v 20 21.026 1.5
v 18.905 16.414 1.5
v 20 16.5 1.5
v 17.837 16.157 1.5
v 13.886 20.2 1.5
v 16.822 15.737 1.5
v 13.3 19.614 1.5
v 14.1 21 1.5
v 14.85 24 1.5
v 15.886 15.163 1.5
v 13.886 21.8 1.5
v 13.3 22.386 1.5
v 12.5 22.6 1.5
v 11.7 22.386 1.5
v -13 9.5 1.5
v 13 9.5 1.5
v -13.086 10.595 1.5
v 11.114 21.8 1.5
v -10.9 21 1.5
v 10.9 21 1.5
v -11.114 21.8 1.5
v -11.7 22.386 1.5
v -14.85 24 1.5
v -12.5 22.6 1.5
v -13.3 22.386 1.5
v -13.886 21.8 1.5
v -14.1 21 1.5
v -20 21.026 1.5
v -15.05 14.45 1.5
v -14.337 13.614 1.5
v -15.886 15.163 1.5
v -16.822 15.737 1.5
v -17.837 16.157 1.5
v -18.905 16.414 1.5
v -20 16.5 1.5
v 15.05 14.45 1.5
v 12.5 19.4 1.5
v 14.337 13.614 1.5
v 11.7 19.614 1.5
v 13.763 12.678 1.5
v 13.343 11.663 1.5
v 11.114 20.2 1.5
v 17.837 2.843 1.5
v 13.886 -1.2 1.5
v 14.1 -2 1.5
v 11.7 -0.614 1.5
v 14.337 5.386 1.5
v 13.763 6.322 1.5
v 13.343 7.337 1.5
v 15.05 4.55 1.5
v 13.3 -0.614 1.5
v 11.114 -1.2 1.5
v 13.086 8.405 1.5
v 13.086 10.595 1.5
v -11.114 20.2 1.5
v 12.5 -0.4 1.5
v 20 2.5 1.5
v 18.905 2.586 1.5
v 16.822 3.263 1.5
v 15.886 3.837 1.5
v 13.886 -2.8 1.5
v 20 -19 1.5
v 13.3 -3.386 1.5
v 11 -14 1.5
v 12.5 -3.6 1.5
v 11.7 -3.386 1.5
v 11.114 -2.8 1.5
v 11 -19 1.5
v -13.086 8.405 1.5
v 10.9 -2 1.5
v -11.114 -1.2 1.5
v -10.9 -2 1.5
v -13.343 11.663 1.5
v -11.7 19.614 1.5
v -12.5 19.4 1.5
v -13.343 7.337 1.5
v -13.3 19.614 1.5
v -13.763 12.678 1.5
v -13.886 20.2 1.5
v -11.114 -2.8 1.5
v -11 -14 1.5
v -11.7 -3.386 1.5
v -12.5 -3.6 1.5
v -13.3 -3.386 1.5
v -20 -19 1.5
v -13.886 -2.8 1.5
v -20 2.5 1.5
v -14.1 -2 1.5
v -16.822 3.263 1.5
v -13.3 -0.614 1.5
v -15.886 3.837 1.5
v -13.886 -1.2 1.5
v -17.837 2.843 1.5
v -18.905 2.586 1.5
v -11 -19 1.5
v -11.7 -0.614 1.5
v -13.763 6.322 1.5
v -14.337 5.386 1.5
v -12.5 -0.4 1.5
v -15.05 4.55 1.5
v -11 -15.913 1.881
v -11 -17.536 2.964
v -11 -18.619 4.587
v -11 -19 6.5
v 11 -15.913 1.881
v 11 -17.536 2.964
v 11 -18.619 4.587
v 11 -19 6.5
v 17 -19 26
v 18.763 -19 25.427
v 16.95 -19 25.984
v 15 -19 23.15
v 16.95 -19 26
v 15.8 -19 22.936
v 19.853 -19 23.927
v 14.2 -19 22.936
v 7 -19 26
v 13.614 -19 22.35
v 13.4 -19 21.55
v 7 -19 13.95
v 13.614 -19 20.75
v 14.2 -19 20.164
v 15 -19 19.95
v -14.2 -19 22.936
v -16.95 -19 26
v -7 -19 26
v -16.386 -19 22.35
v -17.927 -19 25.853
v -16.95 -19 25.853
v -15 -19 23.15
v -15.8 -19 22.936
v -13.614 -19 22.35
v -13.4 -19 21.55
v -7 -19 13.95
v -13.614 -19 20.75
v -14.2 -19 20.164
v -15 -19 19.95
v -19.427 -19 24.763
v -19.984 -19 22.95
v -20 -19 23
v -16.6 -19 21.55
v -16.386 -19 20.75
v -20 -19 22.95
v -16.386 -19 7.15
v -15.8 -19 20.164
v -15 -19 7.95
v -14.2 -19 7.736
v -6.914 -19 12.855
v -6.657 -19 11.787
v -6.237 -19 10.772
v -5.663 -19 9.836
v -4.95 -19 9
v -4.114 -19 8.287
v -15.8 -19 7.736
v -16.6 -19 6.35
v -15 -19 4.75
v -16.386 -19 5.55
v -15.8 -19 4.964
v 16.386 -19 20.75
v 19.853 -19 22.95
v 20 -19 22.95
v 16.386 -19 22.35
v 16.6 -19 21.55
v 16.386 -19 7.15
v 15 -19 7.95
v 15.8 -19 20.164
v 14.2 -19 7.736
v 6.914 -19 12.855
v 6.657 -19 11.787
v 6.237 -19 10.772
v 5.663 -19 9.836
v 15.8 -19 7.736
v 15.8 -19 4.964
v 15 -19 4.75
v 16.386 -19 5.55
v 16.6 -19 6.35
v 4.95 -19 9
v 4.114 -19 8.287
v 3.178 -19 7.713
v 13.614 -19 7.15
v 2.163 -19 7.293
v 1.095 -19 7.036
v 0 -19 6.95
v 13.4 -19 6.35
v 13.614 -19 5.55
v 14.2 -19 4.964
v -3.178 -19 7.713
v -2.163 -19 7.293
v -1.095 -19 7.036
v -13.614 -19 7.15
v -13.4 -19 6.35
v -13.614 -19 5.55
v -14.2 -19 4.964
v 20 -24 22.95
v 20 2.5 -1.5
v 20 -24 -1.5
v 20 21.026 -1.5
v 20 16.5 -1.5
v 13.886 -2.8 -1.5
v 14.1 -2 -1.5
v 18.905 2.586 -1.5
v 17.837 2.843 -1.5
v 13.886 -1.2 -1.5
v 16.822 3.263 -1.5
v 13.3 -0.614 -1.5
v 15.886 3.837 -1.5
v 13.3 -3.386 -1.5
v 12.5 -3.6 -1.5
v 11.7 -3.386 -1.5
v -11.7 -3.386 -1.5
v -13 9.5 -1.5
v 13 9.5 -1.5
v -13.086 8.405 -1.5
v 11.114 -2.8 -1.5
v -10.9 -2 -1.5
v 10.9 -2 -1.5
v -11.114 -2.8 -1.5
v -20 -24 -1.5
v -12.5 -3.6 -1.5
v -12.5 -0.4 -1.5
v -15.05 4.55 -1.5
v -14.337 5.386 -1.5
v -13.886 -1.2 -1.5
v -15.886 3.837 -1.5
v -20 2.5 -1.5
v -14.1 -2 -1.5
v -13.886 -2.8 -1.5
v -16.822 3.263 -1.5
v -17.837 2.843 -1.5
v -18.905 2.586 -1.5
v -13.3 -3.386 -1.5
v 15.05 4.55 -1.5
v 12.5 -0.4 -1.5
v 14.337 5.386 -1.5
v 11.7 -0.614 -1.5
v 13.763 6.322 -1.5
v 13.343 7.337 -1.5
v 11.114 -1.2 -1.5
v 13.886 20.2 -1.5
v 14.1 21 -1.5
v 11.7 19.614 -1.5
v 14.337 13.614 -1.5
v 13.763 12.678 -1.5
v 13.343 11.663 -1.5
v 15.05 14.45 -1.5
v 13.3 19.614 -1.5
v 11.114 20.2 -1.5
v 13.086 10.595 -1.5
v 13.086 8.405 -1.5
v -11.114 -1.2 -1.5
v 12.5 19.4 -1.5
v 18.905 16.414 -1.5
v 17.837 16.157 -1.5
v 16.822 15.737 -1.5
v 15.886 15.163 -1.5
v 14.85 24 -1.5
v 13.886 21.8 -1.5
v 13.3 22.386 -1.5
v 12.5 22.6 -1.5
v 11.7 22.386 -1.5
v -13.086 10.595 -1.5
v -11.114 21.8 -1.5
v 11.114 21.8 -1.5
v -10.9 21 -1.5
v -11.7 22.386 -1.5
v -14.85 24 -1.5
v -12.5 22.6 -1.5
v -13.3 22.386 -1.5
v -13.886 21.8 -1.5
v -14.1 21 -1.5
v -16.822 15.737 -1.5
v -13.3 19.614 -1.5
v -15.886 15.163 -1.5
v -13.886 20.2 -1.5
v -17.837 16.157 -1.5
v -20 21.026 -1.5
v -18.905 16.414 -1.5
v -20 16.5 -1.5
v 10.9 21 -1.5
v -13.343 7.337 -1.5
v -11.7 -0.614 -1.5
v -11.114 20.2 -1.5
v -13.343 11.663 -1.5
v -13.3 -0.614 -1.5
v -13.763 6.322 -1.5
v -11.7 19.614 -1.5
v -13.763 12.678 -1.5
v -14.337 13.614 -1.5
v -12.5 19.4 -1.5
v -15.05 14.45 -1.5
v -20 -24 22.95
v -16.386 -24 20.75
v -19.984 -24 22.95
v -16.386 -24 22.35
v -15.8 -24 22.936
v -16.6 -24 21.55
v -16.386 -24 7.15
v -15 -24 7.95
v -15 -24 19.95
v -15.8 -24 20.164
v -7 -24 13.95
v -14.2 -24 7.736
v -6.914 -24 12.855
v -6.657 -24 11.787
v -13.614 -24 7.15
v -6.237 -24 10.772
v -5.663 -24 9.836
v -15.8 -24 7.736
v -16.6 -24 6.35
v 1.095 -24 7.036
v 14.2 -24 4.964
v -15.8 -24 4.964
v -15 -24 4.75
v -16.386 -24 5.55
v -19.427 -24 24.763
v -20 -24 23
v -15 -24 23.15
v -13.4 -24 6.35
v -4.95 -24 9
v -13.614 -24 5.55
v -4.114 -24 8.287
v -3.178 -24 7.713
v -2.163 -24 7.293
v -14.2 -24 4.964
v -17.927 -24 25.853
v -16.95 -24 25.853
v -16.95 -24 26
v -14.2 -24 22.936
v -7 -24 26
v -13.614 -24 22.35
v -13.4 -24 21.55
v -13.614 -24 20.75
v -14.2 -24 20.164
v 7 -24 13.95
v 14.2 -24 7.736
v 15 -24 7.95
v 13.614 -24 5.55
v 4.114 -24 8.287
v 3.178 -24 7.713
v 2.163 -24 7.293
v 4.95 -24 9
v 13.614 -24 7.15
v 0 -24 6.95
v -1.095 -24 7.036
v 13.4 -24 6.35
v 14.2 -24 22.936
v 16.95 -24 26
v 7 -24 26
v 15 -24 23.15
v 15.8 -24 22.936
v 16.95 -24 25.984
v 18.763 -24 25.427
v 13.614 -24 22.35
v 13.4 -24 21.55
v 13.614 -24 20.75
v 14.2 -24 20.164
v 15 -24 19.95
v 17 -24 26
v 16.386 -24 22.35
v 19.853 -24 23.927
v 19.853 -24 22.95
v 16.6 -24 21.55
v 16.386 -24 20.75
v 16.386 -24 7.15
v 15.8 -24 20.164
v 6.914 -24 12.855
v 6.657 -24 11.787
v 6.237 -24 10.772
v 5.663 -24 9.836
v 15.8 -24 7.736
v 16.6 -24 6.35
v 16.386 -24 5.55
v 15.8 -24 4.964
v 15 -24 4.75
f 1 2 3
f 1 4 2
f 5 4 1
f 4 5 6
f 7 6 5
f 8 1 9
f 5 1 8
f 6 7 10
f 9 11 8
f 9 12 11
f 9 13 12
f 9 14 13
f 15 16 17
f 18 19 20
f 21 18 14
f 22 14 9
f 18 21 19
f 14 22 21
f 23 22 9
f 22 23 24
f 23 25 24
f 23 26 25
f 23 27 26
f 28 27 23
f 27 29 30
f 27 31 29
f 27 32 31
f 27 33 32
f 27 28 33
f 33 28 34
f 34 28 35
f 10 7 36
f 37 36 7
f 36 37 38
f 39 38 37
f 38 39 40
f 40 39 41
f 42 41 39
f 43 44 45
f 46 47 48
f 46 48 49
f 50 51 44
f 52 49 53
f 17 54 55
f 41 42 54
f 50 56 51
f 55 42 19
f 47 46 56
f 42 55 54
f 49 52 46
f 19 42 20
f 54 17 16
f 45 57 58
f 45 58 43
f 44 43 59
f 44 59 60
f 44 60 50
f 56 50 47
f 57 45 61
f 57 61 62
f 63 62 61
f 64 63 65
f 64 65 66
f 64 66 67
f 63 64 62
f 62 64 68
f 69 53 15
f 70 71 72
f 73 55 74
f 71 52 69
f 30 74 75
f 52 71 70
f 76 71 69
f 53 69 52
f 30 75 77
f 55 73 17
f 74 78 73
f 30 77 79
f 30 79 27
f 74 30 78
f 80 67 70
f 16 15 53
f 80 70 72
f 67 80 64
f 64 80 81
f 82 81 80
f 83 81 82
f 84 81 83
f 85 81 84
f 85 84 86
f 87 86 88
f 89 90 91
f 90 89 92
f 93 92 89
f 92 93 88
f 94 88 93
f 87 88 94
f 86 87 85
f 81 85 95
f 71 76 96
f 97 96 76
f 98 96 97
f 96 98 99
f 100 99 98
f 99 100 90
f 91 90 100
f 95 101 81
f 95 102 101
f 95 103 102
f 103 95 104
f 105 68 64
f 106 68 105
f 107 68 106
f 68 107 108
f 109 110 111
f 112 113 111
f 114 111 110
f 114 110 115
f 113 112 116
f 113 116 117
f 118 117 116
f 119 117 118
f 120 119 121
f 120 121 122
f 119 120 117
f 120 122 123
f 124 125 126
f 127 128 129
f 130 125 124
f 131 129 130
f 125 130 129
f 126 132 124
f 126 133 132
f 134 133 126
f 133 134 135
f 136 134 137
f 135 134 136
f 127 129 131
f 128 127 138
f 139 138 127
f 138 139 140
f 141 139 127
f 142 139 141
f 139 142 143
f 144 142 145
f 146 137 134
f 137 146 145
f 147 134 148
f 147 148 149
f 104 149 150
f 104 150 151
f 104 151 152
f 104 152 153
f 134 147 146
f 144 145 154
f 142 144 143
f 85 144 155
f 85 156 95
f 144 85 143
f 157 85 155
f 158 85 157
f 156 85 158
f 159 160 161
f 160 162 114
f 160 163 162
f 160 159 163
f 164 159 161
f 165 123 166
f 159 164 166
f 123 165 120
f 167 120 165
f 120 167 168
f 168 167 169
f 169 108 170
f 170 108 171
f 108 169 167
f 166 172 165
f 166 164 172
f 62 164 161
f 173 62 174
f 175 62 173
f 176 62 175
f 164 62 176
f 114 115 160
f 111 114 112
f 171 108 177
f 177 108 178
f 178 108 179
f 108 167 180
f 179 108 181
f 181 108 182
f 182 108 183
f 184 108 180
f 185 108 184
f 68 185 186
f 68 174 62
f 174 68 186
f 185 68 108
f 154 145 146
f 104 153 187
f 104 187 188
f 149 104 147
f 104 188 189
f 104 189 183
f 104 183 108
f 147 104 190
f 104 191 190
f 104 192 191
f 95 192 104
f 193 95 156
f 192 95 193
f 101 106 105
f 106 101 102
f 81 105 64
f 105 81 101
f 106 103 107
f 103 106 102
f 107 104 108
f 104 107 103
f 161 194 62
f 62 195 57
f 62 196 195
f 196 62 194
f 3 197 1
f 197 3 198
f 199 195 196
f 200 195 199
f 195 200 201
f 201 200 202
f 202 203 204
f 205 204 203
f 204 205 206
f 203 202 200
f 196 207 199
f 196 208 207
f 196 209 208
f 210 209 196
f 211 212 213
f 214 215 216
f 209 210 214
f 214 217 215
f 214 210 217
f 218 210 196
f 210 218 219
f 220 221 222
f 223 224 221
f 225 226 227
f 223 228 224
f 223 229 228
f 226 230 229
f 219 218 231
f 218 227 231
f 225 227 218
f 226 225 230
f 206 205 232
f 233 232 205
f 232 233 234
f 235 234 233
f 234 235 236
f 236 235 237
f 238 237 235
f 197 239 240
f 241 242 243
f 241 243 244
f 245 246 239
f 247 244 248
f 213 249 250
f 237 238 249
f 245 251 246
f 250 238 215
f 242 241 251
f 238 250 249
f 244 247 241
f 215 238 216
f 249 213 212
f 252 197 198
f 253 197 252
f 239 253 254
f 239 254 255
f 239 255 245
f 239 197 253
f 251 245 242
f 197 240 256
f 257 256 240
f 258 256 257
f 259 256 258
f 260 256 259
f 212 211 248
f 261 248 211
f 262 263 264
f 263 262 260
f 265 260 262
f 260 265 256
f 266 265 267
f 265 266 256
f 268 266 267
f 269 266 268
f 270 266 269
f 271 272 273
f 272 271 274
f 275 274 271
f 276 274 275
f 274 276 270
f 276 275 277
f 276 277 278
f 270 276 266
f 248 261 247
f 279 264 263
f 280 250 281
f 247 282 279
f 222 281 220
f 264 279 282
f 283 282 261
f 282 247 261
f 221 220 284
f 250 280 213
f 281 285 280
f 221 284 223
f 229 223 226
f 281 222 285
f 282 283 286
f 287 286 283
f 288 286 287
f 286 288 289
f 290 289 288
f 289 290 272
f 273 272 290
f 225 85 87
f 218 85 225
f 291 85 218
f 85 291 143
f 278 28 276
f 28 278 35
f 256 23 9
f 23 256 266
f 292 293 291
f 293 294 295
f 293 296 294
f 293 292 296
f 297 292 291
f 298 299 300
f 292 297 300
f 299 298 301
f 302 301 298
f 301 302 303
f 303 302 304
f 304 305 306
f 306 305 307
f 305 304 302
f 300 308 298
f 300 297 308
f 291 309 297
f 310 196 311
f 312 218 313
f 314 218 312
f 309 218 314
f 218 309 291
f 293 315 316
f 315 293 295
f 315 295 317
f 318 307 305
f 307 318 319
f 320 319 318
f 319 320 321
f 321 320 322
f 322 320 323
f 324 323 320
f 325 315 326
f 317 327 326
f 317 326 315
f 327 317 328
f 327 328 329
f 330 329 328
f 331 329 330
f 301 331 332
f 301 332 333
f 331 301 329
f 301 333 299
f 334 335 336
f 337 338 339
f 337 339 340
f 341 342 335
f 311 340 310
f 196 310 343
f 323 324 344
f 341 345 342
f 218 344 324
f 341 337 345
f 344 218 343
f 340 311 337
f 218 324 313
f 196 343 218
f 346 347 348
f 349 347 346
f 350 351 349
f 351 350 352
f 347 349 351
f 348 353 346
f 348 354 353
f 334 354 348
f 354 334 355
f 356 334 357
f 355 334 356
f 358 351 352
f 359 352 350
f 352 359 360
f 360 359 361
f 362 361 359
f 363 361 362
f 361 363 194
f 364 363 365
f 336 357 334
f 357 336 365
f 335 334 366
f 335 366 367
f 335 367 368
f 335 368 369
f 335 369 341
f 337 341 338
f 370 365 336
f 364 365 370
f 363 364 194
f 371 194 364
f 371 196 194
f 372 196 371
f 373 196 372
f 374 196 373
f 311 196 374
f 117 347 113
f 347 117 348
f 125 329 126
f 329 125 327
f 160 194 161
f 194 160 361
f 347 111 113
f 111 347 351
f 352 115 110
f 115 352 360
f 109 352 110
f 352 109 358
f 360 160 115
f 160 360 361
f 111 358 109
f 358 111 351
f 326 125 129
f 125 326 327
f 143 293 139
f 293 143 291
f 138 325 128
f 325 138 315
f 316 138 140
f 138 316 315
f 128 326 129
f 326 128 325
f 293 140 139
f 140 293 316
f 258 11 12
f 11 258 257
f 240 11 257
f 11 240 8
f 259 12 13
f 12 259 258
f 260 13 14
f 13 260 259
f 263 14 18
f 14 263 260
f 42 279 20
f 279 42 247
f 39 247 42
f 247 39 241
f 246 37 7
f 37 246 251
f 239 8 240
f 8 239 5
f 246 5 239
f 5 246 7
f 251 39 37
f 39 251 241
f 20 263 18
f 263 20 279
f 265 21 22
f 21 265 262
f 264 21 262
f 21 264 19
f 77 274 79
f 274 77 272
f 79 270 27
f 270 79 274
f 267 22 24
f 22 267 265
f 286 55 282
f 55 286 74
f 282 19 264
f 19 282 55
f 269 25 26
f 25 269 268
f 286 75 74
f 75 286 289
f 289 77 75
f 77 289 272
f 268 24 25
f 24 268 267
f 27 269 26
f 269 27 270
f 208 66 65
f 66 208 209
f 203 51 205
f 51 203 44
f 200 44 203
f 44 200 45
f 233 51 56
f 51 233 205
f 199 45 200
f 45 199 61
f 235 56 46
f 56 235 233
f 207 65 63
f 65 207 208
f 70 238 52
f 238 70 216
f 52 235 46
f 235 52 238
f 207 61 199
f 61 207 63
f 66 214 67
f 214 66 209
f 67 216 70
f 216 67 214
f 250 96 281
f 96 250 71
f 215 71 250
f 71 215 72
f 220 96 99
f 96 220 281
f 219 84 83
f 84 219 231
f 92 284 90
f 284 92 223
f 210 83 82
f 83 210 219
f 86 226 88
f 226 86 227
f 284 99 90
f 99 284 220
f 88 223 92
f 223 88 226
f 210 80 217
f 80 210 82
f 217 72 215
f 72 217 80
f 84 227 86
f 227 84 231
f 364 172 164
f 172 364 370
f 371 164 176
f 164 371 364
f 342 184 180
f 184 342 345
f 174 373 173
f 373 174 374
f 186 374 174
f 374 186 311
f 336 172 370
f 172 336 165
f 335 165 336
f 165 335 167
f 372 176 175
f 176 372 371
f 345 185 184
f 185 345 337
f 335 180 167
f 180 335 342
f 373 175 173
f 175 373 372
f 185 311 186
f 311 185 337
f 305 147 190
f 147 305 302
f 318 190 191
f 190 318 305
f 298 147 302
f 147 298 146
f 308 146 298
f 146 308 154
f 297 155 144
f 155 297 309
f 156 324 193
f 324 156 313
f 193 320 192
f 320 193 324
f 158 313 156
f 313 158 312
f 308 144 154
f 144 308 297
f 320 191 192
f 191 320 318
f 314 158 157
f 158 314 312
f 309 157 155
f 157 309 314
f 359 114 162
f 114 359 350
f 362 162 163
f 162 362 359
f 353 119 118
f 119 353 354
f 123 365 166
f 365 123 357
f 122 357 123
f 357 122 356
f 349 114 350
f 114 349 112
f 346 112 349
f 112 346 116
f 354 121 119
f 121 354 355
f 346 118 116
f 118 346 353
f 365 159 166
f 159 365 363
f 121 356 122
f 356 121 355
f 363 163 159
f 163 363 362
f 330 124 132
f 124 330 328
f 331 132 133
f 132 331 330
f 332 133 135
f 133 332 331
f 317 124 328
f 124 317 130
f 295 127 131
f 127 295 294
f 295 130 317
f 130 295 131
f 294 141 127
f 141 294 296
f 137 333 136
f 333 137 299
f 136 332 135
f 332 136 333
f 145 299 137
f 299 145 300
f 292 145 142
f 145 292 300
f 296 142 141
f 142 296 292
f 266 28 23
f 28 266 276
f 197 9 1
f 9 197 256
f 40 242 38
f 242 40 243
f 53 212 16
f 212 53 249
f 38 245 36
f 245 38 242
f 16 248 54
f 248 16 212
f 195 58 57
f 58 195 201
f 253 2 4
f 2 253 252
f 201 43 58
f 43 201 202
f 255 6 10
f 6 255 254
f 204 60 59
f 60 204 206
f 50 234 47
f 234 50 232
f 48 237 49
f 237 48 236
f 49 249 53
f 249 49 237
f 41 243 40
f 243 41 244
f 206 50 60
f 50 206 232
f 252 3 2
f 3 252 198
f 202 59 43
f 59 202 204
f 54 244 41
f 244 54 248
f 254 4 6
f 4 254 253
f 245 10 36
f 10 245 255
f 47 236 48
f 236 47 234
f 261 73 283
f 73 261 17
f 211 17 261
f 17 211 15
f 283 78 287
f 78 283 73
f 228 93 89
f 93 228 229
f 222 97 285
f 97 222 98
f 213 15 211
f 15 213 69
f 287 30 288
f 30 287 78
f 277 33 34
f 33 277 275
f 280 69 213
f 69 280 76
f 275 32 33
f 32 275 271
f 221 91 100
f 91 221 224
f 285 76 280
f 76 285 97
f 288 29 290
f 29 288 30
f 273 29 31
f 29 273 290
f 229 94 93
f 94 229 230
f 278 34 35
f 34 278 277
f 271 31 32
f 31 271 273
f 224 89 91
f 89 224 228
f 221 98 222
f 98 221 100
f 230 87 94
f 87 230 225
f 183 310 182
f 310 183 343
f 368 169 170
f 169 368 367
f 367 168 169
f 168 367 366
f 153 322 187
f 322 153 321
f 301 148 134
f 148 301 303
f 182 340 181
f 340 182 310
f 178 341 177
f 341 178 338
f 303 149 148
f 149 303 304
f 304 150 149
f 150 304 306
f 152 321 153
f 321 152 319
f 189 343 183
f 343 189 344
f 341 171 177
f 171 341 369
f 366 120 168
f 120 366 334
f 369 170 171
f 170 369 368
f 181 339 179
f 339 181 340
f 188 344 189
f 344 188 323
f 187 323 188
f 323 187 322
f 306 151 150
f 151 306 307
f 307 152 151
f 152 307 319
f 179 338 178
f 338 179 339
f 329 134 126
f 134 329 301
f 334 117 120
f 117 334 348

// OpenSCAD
//j-head infos : 
//total length = 64.7;
//collar inner dia= 12.15
//outer_dia=16;
//isolator_height=49.85
//top_to_collar=4.65;
//collar height=4.6
//collar_bottom_to_coolers=10;
//cooler_height=2.25

//last cooler to bottom=15.75;

hot_end_upper_dia=16;
hot_end_inner_dia=12;
hot_end_groove_length = 4.6;
hot_end_upper_length=4.85;

hot_end_lower_dia =34.5;
hot_end_lower_taper_lng = 10;
hot_end_lower_taper_str_lng=5;

hot_end_holder_length=20;
hot_end_holder_height=4.6;

hot_end_main_block_length=35;

groove_bottom_to_coolers=10;
cooler_height=2.25;
cooler_count=5;
cooler_border=0.95;

bowden_holder_dist=32;
bowden_holder_bolt_dia=4;
bowden_holder_lng= 12;
bowden_tube_dia=5;

bowden_nut_height=3.9;
bowden_nut_dia=9;

block_width=40;
block_length=48;
fan_bolt_dia=4;
fan_bolt_dist=32.2;


bolt_dia = 3.2;
nut_dia=6.4;
nut_height=2.0;

platform_holes_x_dist = 12.5;//21
platform_holes_y_dist = 21;//28;//2 ->-26
platform_holes_y_dist2 = -2;//28;//2 ->-26

belt_pos = -15;
belt_holder_width=24.5;
belt_holder_height=5;

belt_width =6;
belt_thickness=1.95;
belt_dist =10.95;//7
belt_clamp_holes_spacing=30;
belt_clamp_holes_extra=3;
belt_clamp_holes_dist=belt_width+bolt_dia+belt_clamp_holes_extra*2;
echo("belt_clamp_holes_dist", belt_clamp_holes_dist);


hot_end_holder_hole_length =12;
hot_end_holder_hole_width =4;

fan_duct_id=25;
fan_duct_od=40;

fan_duct_slit =5;
slit_center = (fan_duct_od -fan_duct_id)/2 + fan_duct_id;
slit_od = slit_center+ fan_duct_slit/2;
slit_id= slit_center- fan_duct_slit/2;

duct_bolt_dist = 33;
duct_bolt_dia=3.1;
duct_bolt_hole_length=15;
duct_nut_height=2.0;
duct_nut_dia=6.4;
duct_nut_dist =10;

//%rotate([0,0,270]) import_stl("tripple_bearing_platform_back.stl");
//%translate([0,-4.8,15]) import_stl("/home/ckaos/GraphX/data/reprappro-Huxley/Print-Huxley/Individual-STLs/nozzle-mounting.stl");

belt_clamper();
//translate([0,0,22.5])hot_end_holder();
//translate([0,-block_length/2-5,32.5]) rotate([90,0,0]) duct();




module hot_end_holder(thickness=11, air_duct=false)
{
	lat_hole_b_lng = hot_end_holder_hole_length-hot_end_holder_hole_width;

	hot_end_lower_offset = hot_end_groove_length + hot_end_upper_length;
	hot_end_lower_length = block_length-bowden_holder_lng - hot_end_upper_length - hot_end_groove_length;
	hot_end_top = bowden_holder_lng;
	
	bowden_nut_offset =  bowden_holder_lng-bowden_nut_height;

	coolers_smooth=100;
	coolers_top = hot_end_top -hot_end_upper_length-hot_end_groove_length- groove_bottom_to_coolers-cooler_height/2;

	duct_air_conduit_lng= block_length - hot_end_top -hot_end_upper_length- hot_end_groove_length-groove_bottom_to_coolers;
	duct_bolts_pos = -block_length/2 +duct_bolt_hole_length/2;
	duct_nut_pos = -block_length/2 +duct_nut_dist;
	difference()
	{

		cube([block_width,block_length,thickness], center=true);

		//bowden tube hole
		translate([0,block_length/2+0.01,thickness/2]) rotate([90,0,0]) cylinder(h=bowden_holder_lng+0.1, r=bowden_tube_dia/2,$fn=12);
		//bowden tube nut hole
		translate([0,block_length/2-bowden_nut_offset,thickness/2]) rotate([90,0,0]) cylinder(h=bowden_nut_height+0.1, r=bowden_nut_dia/2,$fn=6);


		//hot_end hole
		//top
		translate([0,block_length/2-bowden_holder_lng,thickness/2]) rotate([90,0,0]) cylinder(h=hot_end_upper_length+0.01, r=hot_end_upper_dia/2,$fn=24);
		//groove
		translate([0,block_length/2-hot_end_top-hot_end_upper_length,thickness/2]) rotate([90,0,0]) cylinder(h=hot_end_groove_length+0.01, r=hot_end_inner_dia/2,$fn=24);
		//lower
		translate([0,block_length/2-bowden_holder_lng-hot_end_lower_offset,thickness/2]) rotate([90,0,0]) cylinder(h=hot_end_lower_length+0.01, r=hot_end_upper_dia/2, $fn=24);

		//hot end hole lower taper
		//translate([0,-block_length/2+hot_end_lower_taper_lng,thickness/2]) rotate([90,0,0]) cylinder(h=hot_end_lower_taper_lng+0.1, r1=hot_end_upper_dia/2, r2=fan_duct_id/2, $fn=24);
		//hot end hole lower taper2
		//translate([0,-block_length/2+hot_end_lower_taper_str_lng,thickness/2]) rotate([90,0,0]) cylinder(h=hot_end_lower_taper_str_lng+0.1, r=hot_end_lower_dia/2, $fn=24);

	

		//fan duct join holes
		if (air_duct)
		{
			translate([0,-block_length/2+duct_air_conduit_lng/2,thickness/2])
			rotate([90,0,0])
			difference()
			{
				difference()
				{
					cylinder(h=duct_air_conduit_lng+0.1, r=slit_od/2,$fn=24, center=true);
					cylinder(h=duct_air_conduit_lng+0.01, r=slit_id/2,$fn=24, center=true);
				}
				cube([5,block_length,thickness+0.1], center=true);	
				translate([10,0,0]) cube([1,block_length,thickness+0.1], center=true);
				translate([-10,0,0]) cube([1,block_length,thickness+0.1], center=true);
			}
			//cooling coils
		}

		translate([0,coolers_top-(cooler_border+cooler_height),thickness/2]) rotate([90,0,0]) 
		cooling_coil(hot_end_upper_dia/2+1.5, 2, coolers_smooth);

		translate([0,coolers_top-(cooler_border+cooler_height)-4,thickness/2]) rotate([90,0,0]) 
		 cylinder(h=8, r=hot_end_upper_dia/2+2.5, center=true,$fn=coolers_smooth);

		translate([0,coolers_top-(cooler_border+cooler_height)-8,thickness/2]) rotate([90,0,0]) 
		cooling_coil(hot_end_upper_dia/2+1.5, 2, coolers_smooth);

		//render()
		//{
		difference()
		{
			//translate([0,coolers_top-(cooler_border+cooler_height),thickness/2]) rotate([90,0,0]) 
			//cooling_coil(hot_end_upper_dia/2, 2, coolers_smooth);

			//translate([0,coolers_top-(cooler_border+cooler_height)+10,thickness/2]) rotate([90,0,0]) 
			//cooling_coil(hot_end_upper_dia/2, 2, coolers_smooth);

	
		/*for (i = [0:cooler_count-1])
		{
			
			translate([0,coolers_top-i*(cooler_border+cooler_height),thickness/2]) rotate([90,0,0]) 
			cooling_coil(hot_end_upper_dia/2+5, cooler_height, coolers_smooth);
		
		}*/
			//cube([5,block_length,thickness+0.1], center=true);		
			//translate([10,0,0]) cube([1,block_length,thickness+0.1], center=true);
		}
//}



		//lateral holes
		translate([14,10,0])
		{
		cube([hot_end_holder_hole_width,lat_hole_b_lng,thickness+0.1], center=true);
		translate([0,lat_hole_b_lng/2,0]) cylinder(h=thickness+0.1, r=hot_end_holder_hole_width/2, center=true,$fn=12);
		translate([0,-lat_hole_b_lng/2,0]) cylinder(h=thickness+0.1, r=hot_end_holder_hole_width/2, center=true,$fn=12);
		}

		translate([-14,10,0])
		{
		cube([hot_end_holder_hole_width,lat_hole_b_lng,thickness+0.1], center=true);
		translate([0,lat_hole_b_lng/2,0]) cylinder(h=thickness+0.1, r=hot_end_holder_hole_width/2, center=true,$fn=12);
		translate([0,-lat_hole_b_lng/2,0]) cylinder(h=thickness+0.1, r=hot_end_holder_hole_width/2, center=true,$fn=12);
		}


		//bolt holes
		translate([platform_holes_x_dist,platform_holes_y_dist,0])  cylinder(h=40, r=bolt_dia/2, center=true,$fn=12);
		translate([-platform_holes_x_dist,platform_holes_y_dist,0])  cylinder(h=40, r=bolt_dia/2, center=true,$fn=12);

		translate([platform_holes_x_dist,platform_holes_y_dist2,0])  cylinder(h=40, r=bolt_dia/2, center=true,$fn=12);
		translate([-platform_holes_x_dist,platform_holes_y_dist2,0])  cylinder(h=40, r=bolt_dia/2, center=true,$fn=12);

		//corner cuts
		 translate([-block_width/2,block_length/2+2.8,0])   rotate([0,0,30]) cube([10,10,thickness+0.1], center=true);
		 translate([block_width/2,block_length/2+2.8,0])   rotate([0,0,-30]) cube([10,10,thickness+0.1], center=true);

		
		//fan duct mount holes
		/*translate([duct_bolt_dist/2,duct_bolts_pos,-duct_bolt_dist/2+thickness/2]) rotate([90,0,0]) cylinder(h=duct_bolt_hole_length+0.01, r=duct_bolt_dia/2, center=true,$fn=12);

		translate([-duct_bolt_dist/2,duct_bolts_pos,-duct_bolt_dist/2+thickness/2]) rotate([90,0,0]) cylinder(h=duct_bolt_hole_length+0.01, r=duct_bolt_dia/2, center=true,$fn=12);
	
		
		translate([duct_bolt_dist/2,duct_nut_pos,-duct_bolt_dist/2+thickness/2])  cube([duct_nut_dia,duct_nut_height,10], center=true);
		translate([-duct_bolt_dist/2,duct_nut_pos,-duct_bolt_dist/2+thickness/2])  cube([duct_nut_dia,duct_nut_height,10], center=true);*/
		
	}
		//fan
		//%  translate([0,-4.2,thickness*2-5])   rotate([0,0,0])  fan();
}


module hot_end_holder_top(thickness=10)
{
	lat_hole_b_lng = hot_end_holder_hole_length-hot_end_holder_hole_width;

	hot_end_lower_offset = hot_end_notch_height + hot_end_upper_length;
	hot_end_lower_length = block_length-bowden_holder_lng - hot_end_upper_length - hot_end_notch_height;
	
	bowden_nut_offset =  bowden_holder_lng-bowden_nut_height;

	difference()
	{

		cube([block_width,block_length,thickness], center=true);

		//hot_end hole
		translate([0,block_length/2-bowden_holder_lng,thickness/2]) rotate([90,0,0]) cylinder(h=hot_end_upper_length, r=hot_end_upper_dia/2,$fn=24);

		translate([0,block_length/2-bowden_holder_lng,thickness/2]) rotate([90,0,0]) cylinder(h=block_length-bowden_holder_lng+0.1, r=hot_end_inner_dia/2,$fn=24);
		
		translate([0,block_length/2-bowden_holder_lng-hot_end_lower_offset,thickness/2]) rotate([90,0,0]) cylinder(h=hot_end_lower_length+0.1, r=hot_end_upper_dia/2,$fn=24);
		
		//bowden tube hole
		translate([0,block_length/2+0.01,thickness/2]) rotate([90,0,0]) cylinder(h=bowden_holder_lng+0.1, r=bowden_tube_dia/2,$fn=12);
		//bowden tube nut hole
		translate([0,block_length/2-bowden_nut_offset,thickness/2]) rotate([90,0,0]) cylinder(h=bowden_nut_height+0.1, r=bowden_nut_dia/2,$fn=6);

		
		//lateral holes
		translate([14,10,0])
		{
		cube([hot_end_holder_hole_width,lat_hole_b_lng,11], center=true);
		translate([0,lat_hole_b_lng/2,0]) cylinder(h=11, r=hot_end_holder_hole_width/2, center=true,$fn=12);
		translate([0,-lat_hole_b_lng/2,0]) cylinder(h=11, r=hot_end_holder_hole_width/2, center=true,$fn=12);
		}

		translate([-14,10,0])
		{
		cube([hot_end_holder_hole_width,lat_hole_b_lng,11], center=true);
		translate([0,lat_hole_b_lng/2,0]) cylinder(h=11, r=hot_end_holder_hole_width/2, center=true,$fn=12);
		translate([0,-lat_hole_b_lng/2,0]) cylinder(h=11, r=hot_end_holder_hole_width/2, center=true,$fn=12);
		}

		//bolt holes
		translate([platform_holes_x_dist,platform_holes_y_dist,0])  cylinder(h=40, r=bolt_dia/2, center=true,$fn=12);
		translate([-platform_holes_x_dist,platform_holes_y_dist,0])  cylinder(h=40, r=bolt_dia/2, center=true,$fn=12);

		translate([platform_holes_x_dist,platform_holes_y_dist2,0])  cylinder(h=40, r=bolt_dia/2, center=true,$fn=12);
		translate([-platform_holes_x_dist,platform_holes_y_dist2,0])  cylinder(h=40, r=bolt_dia/2, center=true,$fn=12);
	}
}

module cooling_coil(radius=10, circle_dia=1, smoothness=50)
{
	rotate_extrude(convexity =10, $fn=smoothness)
	translate([radius,0,0])
	circle(r=circle_dia/2 , $fn=smoothness);

	cylinder(h=circle_dia, r=radius, center=true,$fn=32);
}

module fan(thickness=10.3)
{
	difference()
	{
		cube([40,40,thickness], center=true);
		cylinder(h=thickness+0.1, r=38.4/2, center=true,$fn=32);
	}
}

module duct(duct_id=25, duct_od=40, slit=6, thickness=10)
{
	slit_center = (duct_od -duct_id)/2 + duct_id;
	slit_od = slit_center+ slit/2;
	slit_id= slit_center- slit/2;
	difference()
	{
		union()
		{	
			cube([block_width,block_width,thickness], center=true);
			cylinder(h=thickness, r=duct_od/2,$fn=24, center=true);
		}
	 	cylinder(h=thickness+0.01, r=duct_id/2,$fn=24, center=true);
		

		difference()
		{
			cylinder(h=thickness+1, r=slit_od/2,$fn=24, center=true);
			cylinder(h=thickness+1.01, r=slit_id/2,$fn=24, center=true);
		}

		//bolt holes
		rotate([0,0,90]) translate([duct_bolt_dist/2,duct_bolt_dist/2,0])  cylinder(h=15, r=duct_bolt_dia/2, center=true,$fn=12);
		rotate([0,0,90]) translate([duct_bolt_dist/2,-duct_bolt_dist/2,0])  cylinder(h=15, r=duct_bolt_dia/2, center=true,$fn=12);

		rotate([0,0,90]) translate([-duct_bolt_dist/2,duct_bolt_dist/2,0])  cylinder(h=15, r=duct_bolt_dia/2, center=true,$fn=12);
		rotate([0,0,90]) translate([-duct_bolt_dist/2,-duct_bolt_dist/2,0])  cylinder(h=15, r=duct_bolt_dia/2, center=true,$fn=12);

		
	}
	//radial holders
	difference()
	{
		union()
		{
			cube([block_width,2,10], center=true);
			rotate([0,0,90]) cube([block_width,2,10], center=true);
		}
		//bolt holes
		//rotate([0,0,90]) translate([16,17,10])  cylinder(h=15, r=fan_duct_bolt_dia/2, center=true,$fn=12);
		//rotate([0,0,90]) translate([16,-16,0])  cylinder(h=15, r=fan_duct_bolt_dia/2, center=true,$fn=12);

		cylinder(h=10+0.01, r=duct_id/2,$fn=24, center=true);
	}
}



// 7mm from back to belt
module belt_clamper(thickness=3)
{
	belt_holder_pos = -block_length/2+belt_holder_height/2;
	belt_pos=belt_width/2+belt_dist;
	difference()
	{
		union()
		{
			cube([block_width,block_length,thickness], center=true);
			translate([0,belt_holder_pos,belt_holder_width/2  + thickness/2]) cube([block_width,belt_holder_height,belt_holder_width], center=true);
			translate([0, -block_length/2+belt_holder_height,thickness/2]) rotate([0,90,180]) cube_rounding(5,block_width-18,0);
		}

		//bolt holes
		translate([platform_holes_x_dist,platform_holes_y_dist,0])  cylinder(h=thickness+0.01, r=bolt_dia/2, center=true,$fn=12);
		translate([-platform_holes_x_dist,platform_holes_y_dist,0])  cylinder(h=thickness+0.01, r=bolt_dia/2, center=true,$fn=12);

		translate([platform_holes_x_dist,platform_holes_y_dist2,0])  cylinder(h=thickness+0.01, r=bolt_dia/2, center=true,$fn=12);
		translate([-platform_holes_x_dist,platform_holes_y_dist2,0])  cylinder(h=thickness+0.01, r=bolt_dia/2, center=true,$fn=12);

		//belt clamp holes
		translate([belt_clamp_holes_spacing/2,belt_holder_pos,belt_pos-belt_clamp_holes_dist/2])  rotate([90,0,0]) cylinder(h=10, r=bolt_dia/2, center=true,$fn=12);
		translate([-belt_clamp_holes_spacing/2,belt_holder_pos,belt_pos-belt_clamp_holes_dist/2])  rotate([90,0,0]) cylinder(h=10, r=bolt_dia/2, center=true,$fn=12);

		translate([belt_clamp_holes_spacing/2,belt_holder_pos,belt_pos+belt_clamp_holes_dist/2])  rotate([90,0,0]) cylinder(h=10, r=bolt_dia/2, center=true,$fn=12);
		translate([-belt_clamp_holes_spacing/2,belt_holder_pos,belt_pos+belt_clamp_holes_dist/2])  rotate([90,0,0]) cylinder(h=10, r=bolt_dia/2, center=true,$fn=12);

		//corner cuts
		 translate([-block_width/2,block_length/2+2.8,0])   rotate([0,0,30]) cube([10,10,thickness+0.1], center=true);
		 translate([block_width/2,block_length/2+2.8,0])   rotate([0,0,-30]) cube([10,10,thickness+0.1], center=true);
		
		//rounding
		translate([block_width/2,belt_holder_pos,belt_holder_width+thickness/2]) rotate([270,270,0]) cube_rounding(3,belt_holder_height,0.1);
		translate([-block_width/2,belt_holder_pos,belt_holder_width+thickness/2]) rotate([270,180,0]) cube_rounding(3,belt_holder_height,0.1);

		//lateral cuts
		translate([block_width/2,platform_holes_y_dist/2-1,0])  cylinder(h=thickness+0.01, r=7, center=true,$fn=40);
		translate([-block_width/2,platform_holes_y_dist/2-1,0])  cylinder(h=thickness+0.01, r=7, center=true,$fn=40);

		
		translate([0,belt_holder_pos,belt_pos]) rotate([90,0,0])  cylinder(h=belt_holder_height+0.01, r=7, center=true,$fn=40);
		translate([0,belt_holder_pos,belt_pos+7]) rotate([90,0,0])  cube([14,14,belt_holder_height+0.1], center=true);
		
	}

	//%translate([belt_clamp_holes_spacing/2,-8.3,belt_pos]) rotate([90,0,0])  import_stl("belt_tensioner.stl");
	//%translate([-belt_clamp_holes_spacing/2,-8.3,belt_pos]) rotate([90,0,0])  import_stl("belt_tensioner.stl");

	% translate([0, belt_holder_pos+4,belt_pos]) cube([100,belt_thickness,belt_width],center = true);
}




module cube_rounding(width,height, extra=0)
{
	translate([-width/2,-width/2,,0])
	difference()
	{
		cube([width+extra,width+extra,height+extra], center=true);
		 translate([-width/2,-width/2,0]) cylinder(h=(height+extra), r=width, center=true);
		
	}
}
